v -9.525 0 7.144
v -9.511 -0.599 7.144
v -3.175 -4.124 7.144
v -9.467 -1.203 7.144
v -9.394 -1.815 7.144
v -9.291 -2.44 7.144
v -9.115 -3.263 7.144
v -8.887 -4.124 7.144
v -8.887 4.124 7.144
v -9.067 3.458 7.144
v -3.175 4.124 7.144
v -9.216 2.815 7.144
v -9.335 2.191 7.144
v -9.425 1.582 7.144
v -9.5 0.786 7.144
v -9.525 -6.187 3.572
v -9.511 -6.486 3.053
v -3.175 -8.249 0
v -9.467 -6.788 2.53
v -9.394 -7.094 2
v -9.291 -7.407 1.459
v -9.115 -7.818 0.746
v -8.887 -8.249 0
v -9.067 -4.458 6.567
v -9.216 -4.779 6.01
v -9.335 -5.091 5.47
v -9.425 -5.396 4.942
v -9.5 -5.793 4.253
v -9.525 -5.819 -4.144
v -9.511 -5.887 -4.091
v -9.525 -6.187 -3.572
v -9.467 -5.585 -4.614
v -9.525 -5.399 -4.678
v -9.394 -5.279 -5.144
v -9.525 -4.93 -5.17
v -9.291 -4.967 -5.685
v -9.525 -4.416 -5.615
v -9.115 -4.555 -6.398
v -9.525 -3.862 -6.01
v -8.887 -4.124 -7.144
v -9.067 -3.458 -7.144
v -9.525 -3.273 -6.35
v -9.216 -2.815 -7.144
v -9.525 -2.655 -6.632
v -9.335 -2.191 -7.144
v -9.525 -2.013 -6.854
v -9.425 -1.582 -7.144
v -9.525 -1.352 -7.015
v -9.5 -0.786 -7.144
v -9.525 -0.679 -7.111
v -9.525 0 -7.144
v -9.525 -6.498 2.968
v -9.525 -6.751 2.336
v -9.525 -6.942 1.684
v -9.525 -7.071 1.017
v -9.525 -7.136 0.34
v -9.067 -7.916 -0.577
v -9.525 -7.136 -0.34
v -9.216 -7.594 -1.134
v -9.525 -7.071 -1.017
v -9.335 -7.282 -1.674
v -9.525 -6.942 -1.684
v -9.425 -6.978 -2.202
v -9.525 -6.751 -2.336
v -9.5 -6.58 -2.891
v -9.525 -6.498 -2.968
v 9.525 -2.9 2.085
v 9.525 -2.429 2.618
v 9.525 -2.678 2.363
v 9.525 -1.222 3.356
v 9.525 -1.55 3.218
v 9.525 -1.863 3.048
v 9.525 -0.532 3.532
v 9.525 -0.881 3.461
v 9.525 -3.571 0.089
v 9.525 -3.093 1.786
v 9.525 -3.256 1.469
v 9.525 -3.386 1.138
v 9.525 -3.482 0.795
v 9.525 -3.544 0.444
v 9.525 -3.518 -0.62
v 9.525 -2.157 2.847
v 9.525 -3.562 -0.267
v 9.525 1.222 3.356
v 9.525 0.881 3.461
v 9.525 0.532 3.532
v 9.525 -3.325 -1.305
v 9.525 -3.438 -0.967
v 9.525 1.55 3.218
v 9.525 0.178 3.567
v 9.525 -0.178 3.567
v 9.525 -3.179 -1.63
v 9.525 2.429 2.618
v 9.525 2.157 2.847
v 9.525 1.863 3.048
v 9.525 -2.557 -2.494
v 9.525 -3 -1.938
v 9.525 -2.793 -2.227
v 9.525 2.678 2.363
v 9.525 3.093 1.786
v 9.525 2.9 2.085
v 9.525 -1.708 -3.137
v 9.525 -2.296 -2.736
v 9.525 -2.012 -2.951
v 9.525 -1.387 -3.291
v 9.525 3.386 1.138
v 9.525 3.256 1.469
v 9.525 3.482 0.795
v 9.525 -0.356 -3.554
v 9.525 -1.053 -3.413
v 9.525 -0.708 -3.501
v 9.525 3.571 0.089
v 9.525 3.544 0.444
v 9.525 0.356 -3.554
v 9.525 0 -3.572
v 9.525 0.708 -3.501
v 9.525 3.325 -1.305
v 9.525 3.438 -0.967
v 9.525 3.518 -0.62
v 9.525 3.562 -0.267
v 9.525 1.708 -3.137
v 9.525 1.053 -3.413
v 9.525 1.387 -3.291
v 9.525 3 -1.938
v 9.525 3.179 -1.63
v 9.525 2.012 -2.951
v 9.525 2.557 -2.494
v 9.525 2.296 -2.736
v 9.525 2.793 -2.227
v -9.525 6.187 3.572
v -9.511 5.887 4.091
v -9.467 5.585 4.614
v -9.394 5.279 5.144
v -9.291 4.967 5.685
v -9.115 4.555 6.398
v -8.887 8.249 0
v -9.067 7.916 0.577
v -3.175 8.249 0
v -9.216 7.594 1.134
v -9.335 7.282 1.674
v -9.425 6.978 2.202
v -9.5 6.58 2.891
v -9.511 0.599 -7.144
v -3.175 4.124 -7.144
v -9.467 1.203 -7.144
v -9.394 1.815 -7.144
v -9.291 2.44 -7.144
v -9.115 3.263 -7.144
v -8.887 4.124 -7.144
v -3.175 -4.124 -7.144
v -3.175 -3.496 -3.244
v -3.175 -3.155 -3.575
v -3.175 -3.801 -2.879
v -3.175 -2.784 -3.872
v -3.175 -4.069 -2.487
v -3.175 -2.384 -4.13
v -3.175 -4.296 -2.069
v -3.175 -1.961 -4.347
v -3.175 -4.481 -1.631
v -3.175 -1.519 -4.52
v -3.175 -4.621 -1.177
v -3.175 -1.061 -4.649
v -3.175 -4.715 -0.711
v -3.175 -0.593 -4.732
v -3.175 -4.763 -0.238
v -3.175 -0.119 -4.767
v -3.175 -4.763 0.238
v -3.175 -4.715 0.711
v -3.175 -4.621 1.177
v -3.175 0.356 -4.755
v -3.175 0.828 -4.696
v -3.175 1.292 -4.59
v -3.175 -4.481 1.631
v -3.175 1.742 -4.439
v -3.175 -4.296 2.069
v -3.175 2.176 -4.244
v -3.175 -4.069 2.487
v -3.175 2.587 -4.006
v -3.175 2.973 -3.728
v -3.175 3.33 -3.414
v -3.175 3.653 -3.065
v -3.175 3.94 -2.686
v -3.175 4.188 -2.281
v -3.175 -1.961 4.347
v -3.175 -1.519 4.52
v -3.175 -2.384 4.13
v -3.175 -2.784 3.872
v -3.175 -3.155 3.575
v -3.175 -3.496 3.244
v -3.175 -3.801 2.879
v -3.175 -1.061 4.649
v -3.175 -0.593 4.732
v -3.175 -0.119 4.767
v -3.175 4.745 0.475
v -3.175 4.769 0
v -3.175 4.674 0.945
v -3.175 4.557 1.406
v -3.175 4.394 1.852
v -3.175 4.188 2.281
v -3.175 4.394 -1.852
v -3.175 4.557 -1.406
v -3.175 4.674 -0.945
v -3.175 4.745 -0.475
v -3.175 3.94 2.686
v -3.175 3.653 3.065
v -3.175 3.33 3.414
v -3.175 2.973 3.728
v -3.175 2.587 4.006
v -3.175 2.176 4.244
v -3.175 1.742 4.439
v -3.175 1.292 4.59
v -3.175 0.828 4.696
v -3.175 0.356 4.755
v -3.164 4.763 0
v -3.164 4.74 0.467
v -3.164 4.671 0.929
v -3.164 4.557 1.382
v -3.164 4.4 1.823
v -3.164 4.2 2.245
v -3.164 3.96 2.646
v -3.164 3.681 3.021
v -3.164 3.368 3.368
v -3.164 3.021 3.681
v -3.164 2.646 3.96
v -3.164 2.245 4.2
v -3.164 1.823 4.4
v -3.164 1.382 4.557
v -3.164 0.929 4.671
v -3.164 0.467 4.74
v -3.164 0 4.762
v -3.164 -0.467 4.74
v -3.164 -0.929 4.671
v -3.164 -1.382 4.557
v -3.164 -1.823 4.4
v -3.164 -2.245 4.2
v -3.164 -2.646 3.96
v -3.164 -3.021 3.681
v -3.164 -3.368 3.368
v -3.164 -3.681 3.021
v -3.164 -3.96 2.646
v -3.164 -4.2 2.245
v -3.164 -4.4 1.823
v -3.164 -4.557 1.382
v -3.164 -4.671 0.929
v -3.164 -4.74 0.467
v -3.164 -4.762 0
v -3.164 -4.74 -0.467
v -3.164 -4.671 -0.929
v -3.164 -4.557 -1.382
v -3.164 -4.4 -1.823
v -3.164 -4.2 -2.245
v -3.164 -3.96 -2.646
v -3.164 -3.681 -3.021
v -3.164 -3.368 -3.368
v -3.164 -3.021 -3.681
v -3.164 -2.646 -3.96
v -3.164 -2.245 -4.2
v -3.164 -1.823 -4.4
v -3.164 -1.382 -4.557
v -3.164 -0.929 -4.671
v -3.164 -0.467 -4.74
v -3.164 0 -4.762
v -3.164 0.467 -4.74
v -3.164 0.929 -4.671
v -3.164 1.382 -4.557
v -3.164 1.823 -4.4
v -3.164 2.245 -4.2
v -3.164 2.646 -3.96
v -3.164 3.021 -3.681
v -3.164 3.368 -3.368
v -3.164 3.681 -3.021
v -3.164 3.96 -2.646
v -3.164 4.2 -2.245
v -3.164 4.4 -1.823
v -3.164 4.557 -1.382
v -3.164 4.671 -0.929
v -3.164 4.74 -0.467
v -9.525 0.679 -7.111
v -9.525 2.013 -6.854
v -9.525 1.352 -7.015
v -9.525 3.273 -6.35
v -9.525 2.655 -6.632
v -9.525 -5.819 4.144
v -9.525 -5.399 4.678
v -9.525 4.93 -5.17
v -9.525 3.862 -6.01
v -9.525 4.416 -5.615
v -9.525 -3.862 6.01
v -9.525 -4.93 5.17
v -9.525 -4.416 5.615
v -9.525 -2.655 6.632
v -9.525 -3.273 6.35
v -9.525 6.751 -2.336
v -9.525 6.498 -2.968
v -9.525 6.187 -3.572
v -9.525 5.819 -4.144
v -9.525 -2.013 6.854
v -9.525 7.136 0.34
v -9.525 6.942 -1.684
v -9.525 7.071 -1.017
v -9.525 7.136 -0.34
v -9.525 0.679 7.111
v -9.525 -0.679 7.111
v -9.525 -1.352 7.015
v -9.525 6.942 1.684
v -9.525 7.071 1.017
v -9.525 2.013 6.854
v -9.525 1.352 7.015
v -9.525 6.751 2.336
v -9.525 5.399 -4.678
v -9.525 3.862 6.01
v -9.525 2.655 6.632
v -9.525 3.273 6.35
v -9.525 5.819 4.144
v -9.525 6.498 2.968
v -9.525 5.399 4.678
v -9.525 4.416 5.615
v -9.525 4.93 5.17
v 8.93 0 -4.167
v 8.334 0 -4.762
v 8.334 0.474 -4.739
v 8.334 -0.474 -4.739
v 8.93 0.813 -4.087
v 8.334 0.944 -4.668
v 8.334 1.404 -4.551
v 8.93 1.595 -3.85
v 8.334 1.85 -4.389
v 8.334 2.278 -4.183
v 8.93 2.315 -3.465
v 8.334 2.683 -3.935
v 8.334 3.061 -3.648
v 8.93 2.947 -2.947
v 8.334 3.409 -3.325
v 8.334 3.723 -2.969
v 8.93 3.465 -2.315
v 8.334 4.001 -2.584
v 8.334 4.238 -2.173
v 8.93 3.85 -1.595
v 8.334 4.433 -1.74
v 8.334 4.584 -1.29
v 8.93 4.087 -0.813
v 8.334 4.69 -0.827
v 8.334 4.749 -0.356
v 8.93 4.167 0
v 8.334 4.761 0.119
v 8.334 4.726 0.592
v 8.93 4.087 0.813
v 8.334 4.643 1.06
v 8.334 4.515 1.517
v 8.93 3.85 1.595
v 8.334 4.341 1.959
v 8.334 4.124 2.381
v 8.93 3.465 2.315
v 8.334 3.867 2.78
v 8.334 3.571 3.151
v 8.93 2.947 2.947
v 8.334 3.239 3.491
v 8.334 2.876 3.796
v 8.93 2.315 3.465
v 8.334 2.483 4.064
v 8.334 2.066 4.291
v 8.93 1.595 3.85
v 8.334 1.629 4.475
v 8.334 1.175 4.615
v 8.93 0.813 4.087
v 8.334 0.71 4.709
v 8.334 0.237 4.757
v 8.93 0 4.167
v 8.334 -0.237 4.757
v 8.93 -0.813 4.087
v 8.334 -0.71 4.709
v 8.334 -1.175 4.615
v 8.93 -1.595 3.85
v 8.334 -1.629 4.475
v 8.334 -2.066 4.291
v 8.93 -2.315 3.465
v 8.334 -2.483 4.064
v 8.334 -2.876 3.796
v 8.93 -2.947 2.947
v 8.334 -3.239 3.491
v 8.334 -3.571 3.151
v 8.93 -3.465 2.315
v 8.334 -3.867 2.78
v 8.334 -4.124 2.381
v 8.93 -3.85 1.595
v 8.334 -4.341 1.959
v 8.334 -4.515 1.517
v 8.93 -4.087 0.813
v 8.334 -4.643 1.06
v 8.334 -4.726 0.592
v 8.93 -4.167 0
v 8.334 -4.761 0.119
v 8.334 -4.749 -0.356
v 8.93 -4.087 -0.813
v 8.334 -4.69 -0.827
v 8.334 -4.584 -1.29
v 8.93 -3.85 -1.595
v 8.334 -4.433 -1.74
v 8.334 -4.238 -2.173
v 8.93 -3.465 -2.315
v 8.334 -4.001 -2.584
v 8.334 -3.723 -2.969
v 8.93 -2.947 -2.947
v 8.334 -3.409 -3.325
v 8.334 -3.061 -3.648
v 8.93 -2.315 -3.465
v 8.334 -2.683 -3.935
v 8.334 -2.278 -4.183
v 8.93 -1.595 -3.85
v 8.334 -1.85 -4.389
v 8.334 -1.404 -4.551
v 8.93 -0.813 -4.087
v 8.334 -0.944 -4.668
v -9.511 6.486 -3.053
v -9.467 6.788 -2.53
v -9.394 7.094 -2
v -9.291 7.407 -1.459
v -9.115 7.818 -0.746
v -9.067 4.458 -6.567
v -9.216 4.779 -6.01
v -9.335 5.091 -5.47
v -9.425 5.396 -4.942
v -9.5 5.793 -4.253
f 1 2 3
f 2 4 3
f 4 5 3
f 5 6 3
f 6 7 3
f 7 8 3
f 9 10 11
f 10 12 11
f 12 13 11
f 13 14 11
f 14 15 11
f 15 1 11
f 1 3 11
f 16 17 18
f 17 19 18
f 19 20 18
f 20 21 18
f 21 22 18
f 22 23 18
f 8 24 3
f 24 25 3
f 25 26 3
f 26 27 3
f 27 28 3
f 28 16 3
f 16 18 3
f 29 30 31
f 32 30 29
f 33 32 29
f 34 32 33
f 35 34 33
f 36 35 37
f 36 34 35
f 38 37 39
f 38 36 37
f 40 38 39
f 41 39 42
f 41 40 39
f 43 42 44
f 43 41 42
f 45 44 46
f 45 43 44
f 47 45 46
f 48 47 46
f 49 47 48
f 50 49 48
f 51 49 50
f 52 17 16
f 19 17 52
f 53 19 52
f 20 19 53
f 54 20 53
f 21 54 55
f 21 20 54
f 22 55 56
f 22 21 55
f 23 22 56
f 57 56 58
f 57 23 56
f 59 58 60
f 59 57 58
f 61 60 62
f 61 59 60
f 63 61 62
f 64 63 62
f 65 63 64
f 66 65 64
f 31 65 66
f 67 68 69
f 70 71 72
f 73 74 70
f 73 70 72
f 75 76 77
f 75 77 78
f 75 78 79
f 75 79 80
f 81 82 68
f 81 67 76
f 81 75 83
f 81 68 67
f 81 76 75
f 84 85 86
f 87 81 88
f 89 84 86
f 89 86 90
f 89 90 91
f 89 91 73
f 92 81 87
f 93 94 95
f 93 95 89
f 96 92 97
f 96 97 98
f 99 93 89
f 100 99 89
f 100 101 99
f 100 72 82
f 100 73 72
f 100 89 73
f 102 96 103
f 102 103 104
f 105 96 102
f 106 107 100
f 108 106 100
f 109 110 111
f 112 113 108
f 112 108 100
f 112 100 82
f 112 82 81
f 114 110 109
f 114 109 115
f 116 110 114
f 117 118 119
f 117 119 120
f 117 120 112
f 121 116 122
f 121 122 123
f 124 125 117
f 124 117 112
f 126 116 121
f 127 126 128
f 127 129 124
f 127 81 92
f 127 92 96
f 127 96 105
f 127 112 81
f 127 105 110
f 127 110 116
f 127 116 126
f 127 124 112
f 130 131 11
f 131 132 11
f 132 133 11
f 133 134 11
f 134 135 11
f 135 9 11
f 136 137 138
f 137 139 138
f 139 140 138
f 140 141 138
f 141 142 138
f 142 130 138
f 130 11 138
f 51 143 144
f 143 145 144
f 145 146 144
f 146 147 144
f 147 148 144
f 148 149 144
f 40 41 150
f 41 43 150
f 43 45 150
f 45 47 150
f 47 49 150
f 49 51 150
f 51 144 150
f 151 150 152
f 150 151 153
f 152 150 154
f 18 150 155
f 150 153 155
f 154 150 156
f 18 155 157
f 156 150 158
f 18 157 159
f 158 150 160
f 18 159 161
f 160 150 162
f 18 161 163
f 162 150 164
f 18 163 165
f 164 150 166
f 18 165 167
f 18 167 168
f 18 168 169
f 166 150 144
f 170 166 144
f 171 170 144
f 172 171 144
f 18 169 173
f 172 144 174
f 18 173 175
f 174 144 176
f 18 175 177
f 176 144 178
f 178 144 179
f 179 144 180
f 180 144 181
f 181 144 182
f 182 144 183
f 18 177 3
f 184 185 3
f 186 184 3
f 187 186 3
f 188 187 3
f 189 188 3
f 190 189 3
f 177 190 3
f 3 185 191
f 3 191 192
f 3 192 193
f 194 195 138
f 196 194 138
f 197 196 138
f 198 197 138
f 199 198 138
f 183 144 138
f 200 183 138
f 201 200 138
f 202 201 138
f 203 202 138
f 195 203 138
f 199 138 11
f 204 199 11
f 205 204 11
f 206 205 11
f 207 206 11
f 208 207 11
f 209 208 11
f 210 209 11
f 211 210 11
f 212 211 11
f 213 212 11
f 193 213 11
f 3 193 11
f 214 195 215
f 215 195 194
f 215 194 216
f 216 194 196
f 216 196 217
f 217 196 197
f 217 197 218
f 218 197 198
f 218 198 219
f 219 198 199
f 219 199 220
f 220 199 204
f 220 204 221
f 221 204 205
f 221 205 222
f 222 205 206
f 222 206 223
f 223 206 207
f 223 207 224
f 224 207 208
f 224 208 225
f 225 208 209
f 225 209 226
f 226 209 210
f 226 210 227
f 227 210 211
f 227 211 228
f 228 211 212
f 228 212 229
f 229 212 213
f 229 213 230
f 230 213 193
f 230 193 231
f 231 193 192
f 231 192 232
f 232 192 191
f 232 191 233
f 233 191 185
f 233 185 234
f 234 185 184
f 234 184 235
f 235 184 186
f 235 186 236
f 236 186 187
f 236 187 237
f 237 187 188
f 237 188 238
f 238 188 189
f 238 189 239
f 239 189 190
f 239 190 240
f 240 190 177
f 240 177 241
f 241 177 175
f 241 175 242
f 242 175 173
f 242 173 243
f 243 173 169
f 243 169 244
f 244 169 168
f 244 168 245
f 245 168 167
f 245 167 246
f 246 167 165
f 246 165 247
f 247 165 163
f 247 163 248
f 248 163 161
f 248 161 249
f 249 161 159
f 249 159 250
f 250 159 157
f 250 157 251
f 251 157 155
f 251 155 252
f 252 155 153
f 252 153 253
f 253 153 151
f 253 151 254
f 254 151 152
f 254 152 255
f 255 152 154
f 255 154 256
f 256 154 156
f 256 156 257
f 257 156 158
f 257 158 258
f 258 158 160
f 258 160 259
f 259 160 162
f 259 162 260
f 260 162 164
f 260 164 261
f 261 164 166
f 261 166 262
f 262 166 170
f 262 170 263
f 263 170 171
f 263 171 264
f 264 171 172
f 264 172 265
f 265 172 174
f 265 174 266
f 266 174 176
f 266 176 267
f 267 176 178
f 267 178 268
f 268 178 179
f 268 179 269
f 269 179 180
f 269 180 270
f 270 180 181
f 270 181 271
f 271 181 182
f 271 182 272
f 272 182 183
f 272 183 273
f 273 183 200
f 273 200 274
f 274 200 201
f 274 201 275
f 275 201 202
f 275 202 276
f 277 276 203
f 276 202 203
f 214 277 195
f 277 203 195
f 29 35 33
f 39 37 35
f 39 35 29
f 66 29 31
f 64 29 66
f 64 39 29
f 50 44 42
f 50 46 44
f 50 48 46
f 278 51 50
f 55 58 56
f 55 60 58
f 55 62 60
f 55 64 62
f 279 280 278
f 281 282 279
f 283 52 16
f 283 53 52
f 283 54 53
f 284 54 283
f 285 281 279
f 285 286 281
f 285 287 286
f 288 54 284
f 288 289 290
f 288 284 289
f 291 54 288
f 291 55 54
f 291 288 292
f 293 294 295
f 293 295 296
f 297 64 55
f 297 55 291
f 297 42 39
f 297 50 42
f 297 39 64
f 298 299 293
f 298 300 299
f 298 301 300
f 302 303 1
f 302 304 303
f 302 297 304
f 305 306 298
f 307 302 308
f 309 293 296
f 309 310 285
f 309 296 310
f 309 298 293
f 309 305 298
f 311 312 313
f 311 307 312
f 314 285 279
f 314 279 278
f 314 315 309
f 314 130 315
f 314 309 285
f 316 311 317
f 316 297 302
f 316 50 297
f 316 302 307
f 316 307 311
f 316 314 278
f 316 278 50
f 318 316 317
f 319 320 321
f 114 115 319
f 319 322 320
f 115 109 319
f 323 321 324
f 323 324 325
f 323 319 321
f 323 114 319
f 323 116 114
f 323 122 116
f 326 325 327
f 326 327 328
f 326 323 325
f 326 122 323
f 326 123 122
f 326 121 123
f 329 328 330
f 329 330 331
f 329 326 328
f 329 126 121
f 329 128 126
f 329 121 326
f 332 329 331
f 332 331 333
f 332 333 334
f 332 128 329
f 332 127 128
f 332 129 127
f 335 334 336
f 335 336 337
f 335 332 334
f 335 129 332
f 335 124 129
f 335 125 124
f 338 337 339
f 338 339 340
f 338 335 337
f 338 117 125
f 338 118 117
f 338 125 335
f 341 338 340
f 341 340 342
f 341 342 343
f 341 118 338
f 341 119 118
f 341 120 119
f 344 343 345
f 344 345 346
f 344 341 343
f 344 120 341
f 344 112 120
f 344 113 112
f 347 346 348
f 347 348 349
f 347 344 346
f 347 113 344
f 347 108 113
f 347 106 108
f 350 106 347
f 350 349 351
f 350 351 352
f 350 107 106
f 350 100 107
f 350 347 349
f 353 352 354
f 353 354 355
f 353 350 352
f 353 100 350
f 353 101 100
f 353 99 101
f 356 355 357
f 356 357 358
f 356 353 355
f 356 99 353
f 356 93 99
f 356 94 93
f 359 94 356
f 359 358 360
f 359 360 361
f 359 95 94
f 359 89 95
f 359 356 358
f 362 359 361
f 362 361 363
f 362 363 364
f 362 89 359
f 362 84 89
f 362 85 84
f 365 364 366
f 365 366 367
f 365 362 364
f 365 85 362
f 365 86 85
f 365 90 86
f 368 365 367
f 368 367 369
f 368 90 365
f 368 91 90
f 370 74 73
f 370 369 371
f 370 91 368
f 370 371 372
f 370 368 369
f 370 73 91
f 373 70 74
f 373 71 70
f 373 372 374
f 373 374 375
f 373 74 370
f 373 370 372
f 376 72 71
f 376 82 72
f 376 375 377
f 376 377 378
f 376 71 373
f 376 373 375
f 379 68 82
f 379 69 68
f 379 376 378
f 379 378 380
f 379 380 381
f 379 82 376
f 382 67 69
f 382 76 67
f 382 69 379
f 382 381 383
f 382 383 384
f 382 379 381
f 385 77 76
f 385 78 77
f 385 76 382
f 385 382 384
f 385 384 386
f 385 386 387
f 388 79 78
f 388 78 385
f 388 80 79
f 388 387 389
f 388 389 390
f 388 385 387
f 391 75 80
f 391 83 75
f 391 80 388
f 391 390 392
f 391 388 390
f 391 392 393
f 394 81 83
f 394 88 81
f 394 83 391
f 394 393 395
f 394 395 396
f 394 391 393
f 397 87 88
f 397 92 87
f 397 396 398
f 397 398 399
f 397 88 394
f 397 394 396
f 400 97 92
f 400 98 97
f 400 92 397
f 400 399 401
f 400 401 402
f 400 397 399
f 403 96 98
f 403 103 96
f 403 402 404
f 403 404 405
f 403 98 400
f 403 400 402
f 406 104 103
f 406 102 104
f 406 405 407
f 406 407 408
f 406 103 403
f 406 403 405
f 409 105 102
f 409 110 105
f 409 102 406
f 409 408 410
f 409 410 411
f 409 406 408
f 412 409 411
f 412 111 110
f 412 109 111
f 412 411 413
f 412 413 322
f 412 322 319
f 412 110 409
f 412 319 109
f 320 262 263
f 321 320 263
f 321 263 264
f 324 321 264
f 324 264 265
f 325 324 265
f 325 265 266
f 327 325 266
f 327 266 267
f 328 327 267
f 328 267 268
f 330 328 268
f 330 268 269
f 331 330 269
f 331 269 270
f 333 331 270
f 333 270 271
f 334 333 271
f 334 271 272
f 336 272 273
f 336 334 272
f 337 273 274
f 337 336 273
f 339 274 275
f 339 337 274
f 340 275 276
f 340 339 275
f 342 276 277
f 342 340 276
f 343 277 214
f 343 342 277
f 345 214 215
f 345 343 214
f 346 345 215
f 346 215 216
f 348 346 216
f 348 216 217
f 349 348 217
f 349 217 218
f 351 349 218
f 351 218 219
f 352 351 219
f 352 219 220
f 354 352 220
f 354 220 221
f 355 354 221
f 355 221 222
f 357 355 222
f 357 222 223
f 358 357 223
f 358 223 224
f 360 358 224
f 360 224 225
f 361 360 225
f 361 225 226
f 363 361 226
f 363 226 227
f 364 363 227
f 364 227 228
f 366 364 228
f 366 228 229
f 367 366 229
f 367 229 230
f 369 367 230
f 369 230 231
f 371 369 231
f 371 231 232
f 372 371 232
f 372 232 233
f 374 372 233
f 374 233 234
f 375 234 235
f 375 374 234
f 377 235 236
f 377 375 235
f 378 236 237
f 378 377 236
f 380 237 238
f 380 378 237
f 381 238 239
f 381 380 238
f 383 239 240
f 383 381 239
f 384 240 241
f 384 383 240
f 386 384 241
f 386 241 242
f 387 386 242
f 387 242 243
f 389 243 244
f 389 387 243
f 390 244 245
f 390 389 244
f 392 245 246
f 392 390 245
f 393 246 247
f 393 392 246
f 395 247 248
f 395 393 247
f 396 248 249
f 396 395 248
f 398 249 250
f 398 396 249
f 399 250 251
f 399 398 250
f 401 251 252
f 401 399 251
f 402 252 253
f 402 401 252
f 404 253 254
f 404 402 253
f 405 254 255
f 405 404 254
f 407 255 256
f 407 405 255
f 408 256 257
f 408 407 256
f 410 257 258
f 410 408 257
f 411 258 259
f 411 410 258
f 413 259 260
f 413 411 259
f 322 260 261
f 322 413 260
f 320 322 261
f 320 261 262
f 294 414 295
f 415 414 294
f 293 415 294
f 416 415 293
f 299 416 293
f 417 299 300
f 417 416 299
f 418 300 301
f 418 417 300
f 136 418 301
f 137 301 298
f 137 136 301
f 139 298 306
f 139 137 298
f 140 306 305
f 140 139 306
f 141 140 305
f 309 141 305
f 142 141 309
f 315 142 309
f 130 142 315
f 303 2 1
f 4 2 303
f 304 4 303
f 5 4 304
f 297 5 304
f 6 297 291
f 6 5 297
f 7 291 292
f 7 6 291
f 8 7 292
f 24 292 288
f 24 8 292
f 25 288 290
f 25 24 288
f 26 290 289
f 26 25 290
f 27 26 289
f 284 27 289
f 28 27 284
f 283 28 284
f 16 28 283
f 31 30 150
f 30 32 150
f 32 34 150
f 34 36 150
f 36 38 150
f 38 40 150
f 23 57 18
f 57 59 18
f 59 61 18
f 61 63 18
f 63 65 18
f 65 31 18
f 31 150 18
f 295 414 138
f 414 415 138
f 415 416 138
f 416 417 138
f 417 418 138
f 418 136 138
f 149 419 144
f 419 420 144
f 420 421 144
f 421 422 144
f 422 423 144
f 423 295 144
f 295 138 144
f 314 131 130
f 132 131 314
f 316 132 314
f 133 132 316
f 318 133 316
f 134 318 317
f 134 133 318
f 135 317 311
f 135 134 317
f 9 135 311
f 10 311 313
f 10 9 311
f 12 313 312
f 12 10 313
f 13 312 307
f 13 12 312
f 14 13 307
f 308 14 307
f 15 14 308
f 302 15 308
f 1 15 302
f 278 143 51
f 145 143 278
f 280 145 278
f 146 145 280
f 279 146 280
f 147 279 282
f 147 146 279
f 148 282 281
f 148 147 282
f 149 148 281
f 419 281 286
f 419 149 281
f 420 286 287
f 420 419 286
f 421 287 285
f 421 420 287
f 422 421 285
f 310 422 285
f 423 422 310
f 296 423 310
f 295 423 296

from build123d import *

# Parameters (mm, degrees)
SKETCH5_R           = 4.7625
BOSS_EXTRUDE3_DEPTH = 12.7
CHAMFER1_SIZE       = 1.190625
BOSS_EXTRUDE4_DEPTH = 6.35
SKETCH8_OUTSIDE_W   = 91.538
SKETCH8_OUTSIDE_H   = 93.748
SKETCH8_OUTSIDE_R   = 7.14375
CUT_EXTRUDE3_DEPTH  = 20.05
CUT_EXTRUDE3_TAPER  = 60


with BuildPart() as part:
    # Sketch5 → Boss-Extrude3 (new body)
    with BuildSketch(Plane(origin=(9.525, 0, 0), x_dir=(0, 0, -1), z_dir=(1, 0, 0))):
        Circle(SKETCH5_R)
    extrude(amount=-BOSS_EXTRUDE3_DEPTH)

    # Chamfer1
    chamfer1_edges = [part.edges().sort_by_distance(p)[0] for p in [
        (9.525, 0, 4.7625),
    ]]
    chamfer(chamfer1_edges, length=CHAMFER1_SIZE)



with BuildPart() as body_2:
    # Sketch6 → Boss-Extrude4 (new body)
    with BuildSketch(Plane.ZY.offset(3.175)):
        Polygon((7.14375, 4.124445986), (0, 8.248891971), (-7.14375, 4.124445986), (-7.14375, -4.124445986), (0, -8.248891971), (7.14375, -4.124445986), align=None)
    extrude(amount=BOSS_EXTRUDE4_DEPTH)

    # Sketch8 outside → Cut-Extrude3 (cut, through all)
    with BuildSketch(Plane.ZY.offset(9.525)):
        Rectangle(SKETCH8_OUTSIDE_W, SKETCH8_OUTSIDE_H)
        Circle(SKETCH8_OUTSIDE_R, mode=Mode.SUBTRACT)
    extrude(amount=-CUT_EXTRUDE3_DEPTH, taper=CUT_EXTRUDE3_TAPER, mode=Mode.SUBTRACT)


with BuildPart() as part_1:
    add(part.part)

    add(body_2.part)  # Revolve7 merges body 2
    # Sketch13 → Revolve7 (revolve)
    with BuildSketch(Plane.XY):
        Polygon((-3.429, 0), (5.084670523, 0), (-3.175, 4.768723), (-3.429, 4.768723), align=None)
    revolve(axis=Axis((-3.429, 0, 0), (1, 0, 0)))


solid = part_1.part
